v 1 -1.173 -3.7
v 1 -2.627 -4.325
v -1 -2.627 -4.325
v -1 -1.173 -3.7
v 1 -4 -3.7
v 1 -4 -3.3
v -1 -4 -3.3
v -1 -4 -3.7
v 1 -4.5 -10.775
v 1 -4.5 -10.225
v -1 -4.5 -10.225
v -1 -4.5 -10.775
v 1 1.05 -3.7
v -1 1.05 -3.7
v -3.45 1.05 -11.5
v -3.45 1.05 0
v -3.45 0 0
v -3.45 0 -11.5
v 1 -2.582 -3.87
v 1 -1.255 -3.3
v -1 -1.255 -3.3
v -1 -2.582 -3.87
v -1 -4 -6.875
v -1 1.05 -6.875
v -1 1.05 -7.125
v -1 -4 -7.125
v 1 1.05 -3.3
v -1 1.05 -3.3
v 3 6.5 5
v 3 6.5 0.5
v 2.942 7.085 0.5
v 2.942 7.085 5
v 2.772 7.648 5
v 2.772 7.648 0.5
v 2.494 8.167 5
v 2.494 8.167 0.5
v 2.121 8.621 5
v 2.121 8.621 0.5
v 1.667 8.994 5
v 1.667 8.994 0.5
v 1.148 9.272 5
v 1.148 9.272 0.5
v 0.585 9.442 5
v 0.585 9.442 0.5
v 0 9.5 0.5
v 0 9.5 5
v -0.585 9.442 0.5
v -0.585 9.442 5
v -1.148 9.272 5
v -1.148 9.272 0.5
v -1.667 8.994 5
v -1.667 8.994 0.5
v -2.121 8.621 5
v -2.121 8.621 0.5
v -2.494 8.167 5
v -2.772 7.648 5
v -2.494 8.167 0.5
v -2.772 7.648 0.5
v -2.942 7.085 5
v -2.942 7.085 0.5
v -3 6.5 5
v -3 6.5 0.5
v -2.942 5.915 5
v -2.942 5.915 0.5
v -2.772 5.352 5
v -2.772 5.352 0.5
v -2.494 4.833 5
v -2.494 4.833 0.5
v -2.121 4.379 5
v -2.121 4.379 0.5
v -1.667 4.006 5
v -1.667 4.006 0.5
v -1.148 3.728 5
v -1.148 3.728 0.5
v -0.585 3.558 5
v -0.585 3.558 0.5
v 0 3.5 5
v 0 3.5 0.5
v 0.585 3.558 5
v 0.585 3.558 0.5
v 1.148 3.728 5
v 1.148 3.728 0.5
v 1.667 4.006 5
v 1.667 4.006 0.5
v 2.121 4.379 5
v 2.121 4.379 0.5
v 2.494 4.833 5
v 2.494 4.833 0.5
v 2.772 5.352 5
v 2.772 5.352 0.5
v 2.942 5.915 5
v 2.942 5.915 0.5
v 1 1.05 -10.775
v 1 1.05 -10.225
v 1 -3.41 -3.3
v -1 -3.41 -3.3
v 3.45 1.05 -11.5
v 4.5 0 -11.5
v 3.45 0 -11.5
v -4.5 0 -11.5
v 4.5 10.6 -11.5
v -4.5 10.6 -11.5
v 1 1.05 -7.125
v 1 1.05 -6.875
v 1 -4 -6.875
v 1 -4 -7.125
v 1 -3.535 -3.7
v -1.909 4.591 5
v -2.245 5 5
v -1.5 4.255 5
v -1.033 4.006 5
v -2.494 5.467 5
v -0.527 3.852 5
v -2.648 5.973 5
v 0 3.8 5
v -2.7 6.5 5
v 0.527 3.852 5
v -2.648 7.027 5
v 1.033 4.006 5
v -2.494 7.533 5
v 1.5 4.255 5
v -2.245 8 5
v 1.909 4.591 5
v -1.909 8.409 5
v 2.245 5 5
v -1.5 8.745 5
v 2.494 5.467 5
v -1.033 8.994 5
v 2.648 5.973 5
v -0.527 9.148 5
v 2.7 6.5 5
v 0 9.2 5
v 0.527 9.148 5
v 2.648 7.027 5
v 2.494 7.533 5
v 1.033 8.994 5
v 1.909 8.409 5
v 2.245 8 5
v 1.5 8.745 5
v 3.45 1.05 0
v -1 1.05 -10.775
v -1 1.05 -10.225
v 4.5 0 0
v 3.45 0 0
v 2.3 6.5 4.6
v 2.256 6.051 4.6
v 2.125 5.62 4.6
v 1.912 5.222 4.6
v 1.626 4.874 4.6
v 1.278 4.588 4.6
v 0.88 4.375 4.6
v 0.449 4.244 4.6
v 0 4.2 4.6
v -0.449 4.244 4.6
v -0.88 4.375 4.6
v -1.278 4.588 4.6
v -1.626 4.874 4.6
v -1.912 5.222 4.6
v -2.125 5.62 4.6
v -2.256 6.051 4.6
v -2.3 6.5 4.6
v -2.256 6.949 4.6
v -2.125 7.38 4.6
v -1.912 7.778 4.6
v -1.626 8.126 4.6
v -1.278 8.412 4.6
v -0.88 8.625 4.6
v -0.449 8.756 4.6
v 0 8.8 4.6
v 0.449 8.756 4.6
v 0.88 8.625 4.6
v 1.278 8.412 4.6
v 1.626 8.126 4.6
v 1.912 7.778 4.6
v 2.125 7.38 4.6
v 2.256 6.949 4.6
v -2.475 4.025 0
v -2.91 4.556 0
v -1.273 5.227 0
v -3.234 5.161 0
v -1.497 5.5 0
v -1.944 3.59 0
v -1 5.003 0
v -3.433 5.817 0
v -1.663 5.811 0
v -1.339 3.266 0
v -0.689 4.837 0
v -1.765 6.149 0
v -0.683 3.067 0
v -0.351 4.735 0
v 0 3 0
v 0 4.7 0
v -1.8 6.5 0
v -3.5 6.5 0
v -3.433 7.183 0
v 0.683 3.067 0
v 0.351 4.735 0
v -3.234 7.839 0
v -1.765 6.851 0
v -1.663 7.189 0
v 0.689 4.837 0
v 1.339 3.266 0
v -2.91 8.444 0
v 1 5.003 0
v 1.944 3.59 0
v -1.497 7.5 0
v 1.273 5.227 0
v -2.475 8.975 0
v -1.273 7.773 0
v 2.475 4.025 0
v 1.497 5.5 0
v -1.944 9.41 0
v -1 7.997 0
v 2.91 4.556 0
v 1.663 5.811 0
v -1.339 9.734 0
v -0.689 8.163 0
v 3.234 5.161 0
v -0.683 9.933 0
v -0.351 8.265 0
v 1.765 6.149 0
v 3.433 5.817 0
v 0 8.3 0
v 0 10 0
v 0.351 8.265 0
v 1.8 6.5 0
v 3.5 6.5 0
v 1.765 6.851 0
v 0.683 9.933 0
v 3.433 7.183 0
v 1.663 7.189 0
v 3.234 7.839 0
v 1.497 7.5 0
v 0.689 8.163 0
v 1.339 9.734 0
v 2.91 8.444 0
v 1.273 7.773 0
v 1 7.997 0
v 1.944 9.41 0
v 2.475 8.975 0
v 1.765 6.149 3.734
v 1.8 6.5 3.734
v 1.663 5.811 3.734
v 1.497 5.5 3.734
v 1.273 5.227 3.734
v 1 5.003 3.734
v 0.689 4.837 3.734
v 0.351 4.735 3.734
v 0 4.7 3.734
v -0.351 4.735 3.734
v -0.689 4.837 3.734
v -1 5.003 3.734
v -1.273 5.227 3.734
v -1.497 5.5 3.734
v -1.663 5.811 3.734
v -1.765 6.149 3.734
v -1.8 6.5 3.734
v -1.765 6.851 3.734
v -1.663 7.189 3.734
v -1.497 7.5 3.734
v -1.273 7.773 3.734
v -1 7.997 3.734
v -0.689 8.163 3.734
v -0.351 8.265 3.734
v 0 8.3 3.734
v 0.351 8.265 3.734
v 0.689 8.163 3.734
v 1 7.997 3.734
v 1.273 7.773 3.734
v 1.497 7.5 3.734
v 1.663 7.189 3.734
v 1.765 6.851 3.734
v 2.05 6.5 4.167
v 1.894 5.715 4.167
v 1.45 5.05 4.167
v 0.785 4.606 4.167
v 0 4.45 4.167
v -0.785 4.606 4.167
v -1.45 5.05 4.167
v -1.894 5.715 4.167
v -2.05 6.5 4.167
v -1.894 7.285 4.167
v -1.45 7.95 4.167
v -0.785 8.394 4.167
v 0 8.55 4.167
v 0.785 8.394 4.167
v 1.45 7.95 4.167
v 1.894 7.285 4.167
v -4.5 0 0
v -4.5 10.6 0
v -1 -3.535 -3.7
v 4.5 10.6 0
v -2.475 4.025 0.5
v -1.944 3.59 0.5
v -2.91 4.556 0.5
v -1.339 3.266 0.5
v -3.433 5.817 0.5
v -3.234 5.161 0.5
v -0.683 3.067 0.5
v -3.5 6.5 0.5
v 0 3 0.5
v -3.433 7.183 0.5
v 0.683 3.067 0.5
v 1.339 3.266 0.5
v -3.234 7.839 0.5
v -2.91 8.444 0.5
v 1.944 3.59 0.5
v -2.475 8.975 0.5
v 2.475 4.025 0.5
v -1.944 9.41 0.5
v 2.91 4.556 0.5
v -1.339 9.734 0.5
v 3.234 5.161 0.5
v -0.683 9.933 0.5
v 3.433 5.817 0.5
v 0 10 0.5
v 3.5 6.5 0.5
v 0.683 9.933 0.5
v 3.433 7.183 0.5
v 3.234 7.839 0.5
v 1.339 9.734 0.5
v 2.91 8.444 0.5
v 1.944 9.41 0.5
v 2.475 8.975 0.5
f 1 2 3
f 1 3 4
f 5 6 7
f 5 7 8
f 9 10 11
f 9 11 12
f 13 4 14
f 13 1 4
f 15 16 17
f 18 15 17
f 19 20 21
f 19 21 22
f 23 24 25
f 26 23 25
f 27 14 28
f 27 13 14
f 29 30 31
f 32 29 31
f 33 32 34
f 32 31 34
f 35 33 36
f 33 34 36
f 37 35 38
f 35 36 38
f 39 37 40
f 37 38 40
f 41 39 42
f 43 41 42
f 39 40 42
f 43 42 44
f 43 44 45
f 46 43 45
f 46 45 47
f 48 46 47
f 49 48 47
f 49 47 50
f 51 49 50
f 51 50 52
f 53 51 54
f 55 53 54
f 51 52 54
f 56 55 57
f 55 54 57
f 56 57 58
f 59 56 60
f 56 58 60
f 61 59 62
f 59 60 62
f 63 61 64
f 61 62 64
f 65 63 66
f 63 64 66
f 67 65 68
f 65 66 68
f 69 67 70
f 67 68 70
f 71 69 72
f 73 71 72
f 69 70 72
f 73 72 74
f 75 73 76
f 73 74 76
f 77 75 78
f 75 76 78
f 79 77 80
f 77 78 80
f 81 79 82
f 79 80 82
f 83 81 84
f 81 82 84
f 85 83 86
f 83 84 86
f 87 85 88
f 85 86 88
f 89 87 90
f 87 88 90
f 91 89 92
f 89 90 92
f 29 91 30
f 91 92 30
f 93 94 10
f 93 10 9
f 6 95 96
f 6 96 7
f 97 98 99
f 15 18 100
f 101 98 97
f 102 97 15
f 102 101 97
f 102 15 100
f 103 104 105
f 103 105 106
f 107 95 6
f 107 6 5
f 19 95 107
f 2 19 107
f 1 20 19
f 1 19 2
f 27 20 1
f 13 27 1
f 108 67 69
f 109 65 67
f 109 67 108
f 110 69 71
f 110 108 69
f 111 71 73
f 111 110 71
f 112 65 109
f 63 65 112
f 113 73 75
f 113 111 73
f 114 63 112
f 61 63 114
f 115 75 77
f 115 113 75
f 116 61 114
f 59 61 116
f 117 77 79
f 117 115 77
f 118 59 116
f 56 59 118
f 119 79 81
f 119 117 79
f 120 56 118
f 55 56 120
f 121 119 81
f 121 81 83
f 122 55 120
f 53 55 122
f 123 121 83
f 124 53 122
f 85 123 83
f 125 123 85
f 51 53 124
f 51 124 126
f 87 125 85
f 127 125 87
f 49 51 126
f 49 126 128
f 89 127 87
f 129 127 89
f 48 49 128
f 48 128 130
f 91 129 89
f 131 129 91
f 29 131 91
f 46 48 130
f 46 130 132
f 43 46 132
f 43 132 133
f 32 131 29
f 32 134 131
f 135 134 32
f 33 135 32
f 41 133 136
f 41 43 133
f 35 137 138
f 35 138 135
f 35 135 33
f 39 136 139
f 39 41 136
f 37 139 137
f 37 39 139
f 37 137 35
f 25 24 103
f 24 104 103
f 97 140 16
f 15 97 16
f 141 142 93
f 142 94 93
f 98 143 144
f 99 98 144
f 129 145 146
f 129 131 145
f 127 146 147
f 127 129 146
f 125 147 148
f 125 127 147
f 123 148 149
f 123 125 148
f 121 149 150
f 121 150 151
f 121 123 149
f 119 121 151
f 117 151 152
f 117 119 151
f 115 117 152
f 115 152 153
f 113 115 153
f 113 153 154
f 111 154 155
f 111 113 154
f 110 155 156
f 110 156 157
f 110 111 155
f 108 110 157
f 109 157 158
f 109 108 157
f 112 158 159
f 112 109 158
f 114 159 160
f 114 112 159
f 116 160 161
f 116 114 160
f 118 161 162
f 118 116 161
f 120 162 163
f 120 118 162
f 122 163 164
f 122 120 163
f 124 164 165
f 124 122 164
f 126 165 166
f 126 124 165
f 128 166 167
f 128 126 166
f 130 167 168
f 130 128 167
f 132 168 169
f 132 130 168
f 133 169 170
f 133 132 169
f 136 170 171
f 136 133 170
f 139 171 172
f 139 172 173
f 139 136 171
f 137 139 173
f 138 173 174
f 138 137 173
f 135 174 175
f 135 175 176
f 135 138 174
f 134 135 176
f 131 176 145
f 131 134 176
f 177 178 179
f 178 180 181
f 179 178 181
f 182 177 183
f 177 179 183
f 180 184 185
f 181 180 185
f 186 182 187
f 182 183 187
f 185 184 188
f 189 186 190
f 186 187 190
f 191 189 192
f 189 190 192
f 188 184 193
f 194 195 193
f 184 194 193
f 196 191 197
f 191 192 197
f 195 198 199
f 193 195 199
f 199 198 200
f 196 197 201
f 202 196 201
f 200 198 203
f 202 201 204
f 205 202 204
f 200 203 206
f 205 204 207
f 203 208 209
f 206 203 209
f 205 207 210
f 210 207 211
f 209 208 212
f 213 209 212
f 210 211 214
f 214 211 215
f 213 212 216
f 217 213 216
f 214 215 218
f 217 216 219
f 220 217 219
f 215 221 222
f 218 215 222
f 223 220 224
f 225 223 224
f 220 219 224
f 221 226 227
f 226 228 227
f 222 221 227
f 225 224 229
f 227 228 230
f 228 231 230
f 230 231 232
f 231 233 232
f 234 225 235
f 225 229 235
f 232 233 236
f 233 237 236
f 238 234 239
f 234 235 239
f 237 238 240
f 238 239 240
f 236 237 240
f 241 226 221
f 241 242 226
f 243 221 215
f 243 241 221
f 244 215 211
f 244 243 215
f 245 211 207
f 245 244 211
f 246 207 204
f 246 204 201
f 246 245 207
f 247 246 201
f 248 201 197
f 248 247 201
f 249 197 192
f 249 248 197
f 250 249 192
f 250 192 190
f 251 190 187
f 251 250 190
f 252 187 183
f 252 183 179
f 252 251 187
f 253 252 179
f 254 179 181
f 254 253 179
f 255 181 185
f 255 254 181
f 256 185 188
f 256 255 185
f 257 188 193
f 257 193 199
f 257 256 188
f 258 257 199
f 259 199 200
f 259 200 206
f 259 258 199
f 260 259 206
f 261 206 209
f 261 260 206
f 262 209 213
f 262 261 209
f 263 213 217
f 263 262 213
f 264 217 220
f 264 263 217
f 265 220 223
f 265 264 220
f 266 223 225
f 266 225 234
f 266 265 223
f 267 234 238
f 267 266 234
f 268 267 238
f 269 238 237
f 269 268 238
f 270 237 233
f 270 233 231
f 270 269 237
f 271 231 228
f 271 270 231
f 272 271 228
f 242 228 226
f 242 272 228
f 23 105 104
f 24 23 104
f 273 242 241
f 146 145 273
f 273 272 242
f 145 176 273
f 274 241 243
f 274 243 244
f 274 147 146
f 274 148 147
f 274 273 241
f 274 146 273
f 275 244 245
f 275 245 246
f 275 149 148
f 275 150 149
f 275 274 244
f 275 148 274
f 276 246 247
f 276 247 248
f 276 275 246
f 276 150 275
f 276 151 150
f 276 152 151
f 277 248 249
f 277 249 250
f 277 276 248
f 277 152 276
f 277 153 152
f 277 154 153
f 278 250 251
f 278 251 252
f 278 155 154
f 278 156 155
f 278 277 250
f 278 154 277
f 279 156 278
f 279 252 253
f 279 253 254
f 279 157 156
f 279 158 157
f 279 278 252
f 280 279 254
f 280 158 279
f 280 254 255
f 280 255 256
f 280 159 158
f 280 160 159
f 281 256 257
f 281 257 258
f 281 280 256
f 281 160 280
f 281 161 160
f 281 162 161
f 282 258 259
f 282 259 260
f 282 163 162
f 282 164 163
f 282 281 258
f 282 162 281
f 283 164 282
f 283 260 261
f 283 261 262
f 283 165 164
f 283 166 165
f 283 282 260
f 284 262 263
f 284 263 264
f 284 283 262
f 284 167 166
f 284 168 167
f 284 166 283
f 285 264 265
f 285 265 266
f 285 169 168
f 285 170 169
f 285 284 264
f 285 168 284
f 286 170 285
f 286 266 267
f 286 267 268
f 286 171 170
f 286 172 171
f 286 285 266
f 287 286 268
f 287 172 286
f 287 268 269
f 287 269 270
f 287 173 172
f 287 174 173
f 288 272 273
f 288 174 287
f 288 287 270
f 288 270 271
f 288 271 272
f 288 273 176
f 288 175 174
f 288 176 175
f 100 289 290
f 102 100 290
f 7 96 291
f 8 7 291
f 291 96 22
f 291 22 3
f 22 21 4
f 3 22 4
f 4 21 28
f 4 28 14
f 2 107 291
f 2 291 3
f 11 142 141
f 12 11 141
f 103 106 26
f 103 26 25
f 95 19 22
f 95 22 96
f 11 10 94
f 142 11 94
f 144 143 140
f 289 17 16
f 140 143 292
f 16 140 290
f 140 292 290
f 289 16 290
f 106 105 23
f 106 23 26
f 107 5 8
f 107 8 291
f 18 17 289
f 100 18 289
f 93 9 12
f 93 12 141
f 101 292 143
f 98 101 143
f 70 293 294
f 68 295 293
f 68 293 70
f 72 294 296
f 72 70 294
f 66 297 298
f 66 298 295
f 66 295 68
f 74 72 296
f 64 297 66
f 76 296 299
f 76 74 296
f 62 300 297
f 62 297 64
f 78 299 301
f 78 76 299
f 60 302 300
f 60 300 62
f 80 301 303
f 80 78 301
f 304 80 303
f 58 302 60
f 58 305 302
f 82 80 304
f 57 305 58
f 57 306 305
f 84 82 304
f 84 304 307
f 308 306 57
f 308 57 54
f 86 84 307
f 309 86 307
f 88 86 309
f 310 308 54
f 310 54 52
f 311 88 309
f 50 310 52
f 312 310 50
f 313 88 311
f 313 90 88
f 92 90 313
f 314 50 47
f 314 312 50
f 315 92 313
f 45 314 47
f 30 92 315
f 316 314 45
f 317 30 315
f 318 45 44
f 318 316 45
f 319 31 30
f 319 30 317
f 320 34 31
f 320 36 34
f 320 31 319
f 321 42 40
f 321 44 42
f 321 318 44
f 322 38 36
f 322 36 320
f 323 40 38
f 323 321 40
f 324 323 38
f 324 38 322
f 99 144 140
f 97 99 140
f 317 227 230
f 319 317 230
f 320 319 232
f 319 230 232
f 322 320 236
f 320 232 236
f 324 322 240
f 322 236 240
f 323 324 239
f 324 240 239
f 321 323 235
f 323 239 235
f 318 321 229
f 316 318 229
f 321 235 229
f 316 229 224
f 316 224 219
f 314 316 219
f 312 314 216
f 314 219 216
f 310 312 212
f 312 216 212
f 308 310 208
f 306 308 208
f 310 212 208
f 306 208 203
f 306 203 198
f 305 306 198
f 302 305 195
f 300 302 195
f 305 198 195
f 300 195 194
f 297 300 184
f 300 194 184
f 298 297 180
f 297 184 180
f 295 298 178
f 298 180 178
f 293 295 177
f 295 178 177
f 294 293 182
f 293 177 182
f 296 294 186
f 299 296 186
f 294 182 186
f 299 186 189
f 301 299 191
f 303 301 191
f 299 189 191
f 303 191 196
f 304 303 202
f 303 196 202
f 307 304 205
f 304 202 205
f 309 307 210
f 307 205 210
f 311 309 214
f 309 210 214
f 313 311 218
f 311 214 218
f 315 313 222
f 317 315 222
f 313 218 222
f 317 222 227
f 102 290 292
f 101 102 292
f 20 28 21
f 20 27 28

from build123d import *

# Parameters (mm, degrees)
BOSS_EXTRUDE1_DEPTH   = 11.5
SKETCH2_R             = 3.5
BOSS_EXTRUDE2_DEPTH   = 0.5
SKETCH3_R             = 3
BOSS_EXTRUDE3_DEPTH   = 4.5
BOSS_EXTRUDE4_DEPTH   = 1
SKETCH5_W             = 0.25
SKETCH5_H             = 5.05
BOSS_EXTRUDE4_2_DEPTH = 1
SKETCH5_W_2           = 0.55
SKETCH5_H_2           = 5.55
BOSS_EXTRUDE4_3_DEPTH = 1


with BuildPart() as part:
    # Sketch1 → Boss-Extrude1 (new body)
    with BuildSketch(Plane.XY):
        Polygon((-4.5, 10.6), (4.5, 10.6), (4.5, 0), (3.45, 0), (3.45, 1.05), (-3.45, 1.05), (-3.45, 0), (-4.5, 0), align=None)
    extrude(amount=-BOSS_EXTRUDE1_DEPTH)


with BuildPart() as body_2:
    # Sketch2 → Boss-Extrude2 (new body)
    with BuildSketch(Plane.XY):
        with Locations((0, 6.5)):
            Circle(SKETCH2_R)
    extrude(amount=BOSS_EXTRUDE2_DEPTH)

    # Sketch3 → Boss-Extrude3 (add)
    with BuildSketch(Plane.XY.offset(0.5)):
        with Locations((0, 6.5)):
            Circle(SKETCH3_R)
    extrude(amount=BOSS_EXTRUDE3_DEPTH)

    # Sketch4 → Cut-Revolve1 (revolve, cut)
    with BuildSketch(Plane(origin=(0, 6.5, 0), x_dir=(1, 0, 0), z_dir=(0, 1, 0))):
        Polygon((0, 0), (1.8, 0), (1.8, -3.733974596), (2.3, -4.6), (2.7, -5), (0, -5), align=None)
    revolve(axis=Axis((0, 6.5, 5), (0, 0, -1)), mode=Mode.SUBTRACT)


with BuildPart() as body_3:
    # Sketch5 → Boss-Extrude4 (new, symmetric)
    with BuildSketch(Plane(origin=(0, 0, 0), x_dir=(0, 0, -1), z_dir=(1, 0, 0))):
        Polygon((3.3, 1.05), (3.3, -1.255323904), (3.870369506, -2.581808326), (3.3, -3.410189816), (3.3, -4), (3.7, -4), (3.7, -3.534579776), (4.325091858, -2.626721766), (3.7, -1.172971866), (3.7, 1.05), align=None)
    extrude(amount=BOSS_EXTRUDE4_DEPTH, both=True)


with BuildPart() as body_4:
    # Sketch5 → Boss-Extrude4 2 (new, symmetric)
    with BuildSketch(Plane(origin=(0, 0, 0), x_dir=(0, 0, -1), z_dir=(1, 0, 0))):
        with Locations((7, -1.475)):
            Rectangle(SKETCH5_W, SKETCH5_H)
    extrude(amount=BOSS_EXTRUDE4_2_DEPTH, both=True)


with BuildPart() as body_5:
    # Sketch5 → Boss-Extrude4 3 (new, symmetric)
    with BuildSketch(Plane(origin=(0, 0, 0), x_dir=(0, 0, -1), z_dir=(1, 0, 0))):
        with Locations((10.5, -1.725)):
            Rectangle(SKETCH5_W_2, SKETCH5_H_2)
    extrude(amount=BOSS_EXTRUDE4_3_DEPTH, both=True)


solid = Compound([part.part, body_2.part, body_3.part, body_4.part, body_5.part])
